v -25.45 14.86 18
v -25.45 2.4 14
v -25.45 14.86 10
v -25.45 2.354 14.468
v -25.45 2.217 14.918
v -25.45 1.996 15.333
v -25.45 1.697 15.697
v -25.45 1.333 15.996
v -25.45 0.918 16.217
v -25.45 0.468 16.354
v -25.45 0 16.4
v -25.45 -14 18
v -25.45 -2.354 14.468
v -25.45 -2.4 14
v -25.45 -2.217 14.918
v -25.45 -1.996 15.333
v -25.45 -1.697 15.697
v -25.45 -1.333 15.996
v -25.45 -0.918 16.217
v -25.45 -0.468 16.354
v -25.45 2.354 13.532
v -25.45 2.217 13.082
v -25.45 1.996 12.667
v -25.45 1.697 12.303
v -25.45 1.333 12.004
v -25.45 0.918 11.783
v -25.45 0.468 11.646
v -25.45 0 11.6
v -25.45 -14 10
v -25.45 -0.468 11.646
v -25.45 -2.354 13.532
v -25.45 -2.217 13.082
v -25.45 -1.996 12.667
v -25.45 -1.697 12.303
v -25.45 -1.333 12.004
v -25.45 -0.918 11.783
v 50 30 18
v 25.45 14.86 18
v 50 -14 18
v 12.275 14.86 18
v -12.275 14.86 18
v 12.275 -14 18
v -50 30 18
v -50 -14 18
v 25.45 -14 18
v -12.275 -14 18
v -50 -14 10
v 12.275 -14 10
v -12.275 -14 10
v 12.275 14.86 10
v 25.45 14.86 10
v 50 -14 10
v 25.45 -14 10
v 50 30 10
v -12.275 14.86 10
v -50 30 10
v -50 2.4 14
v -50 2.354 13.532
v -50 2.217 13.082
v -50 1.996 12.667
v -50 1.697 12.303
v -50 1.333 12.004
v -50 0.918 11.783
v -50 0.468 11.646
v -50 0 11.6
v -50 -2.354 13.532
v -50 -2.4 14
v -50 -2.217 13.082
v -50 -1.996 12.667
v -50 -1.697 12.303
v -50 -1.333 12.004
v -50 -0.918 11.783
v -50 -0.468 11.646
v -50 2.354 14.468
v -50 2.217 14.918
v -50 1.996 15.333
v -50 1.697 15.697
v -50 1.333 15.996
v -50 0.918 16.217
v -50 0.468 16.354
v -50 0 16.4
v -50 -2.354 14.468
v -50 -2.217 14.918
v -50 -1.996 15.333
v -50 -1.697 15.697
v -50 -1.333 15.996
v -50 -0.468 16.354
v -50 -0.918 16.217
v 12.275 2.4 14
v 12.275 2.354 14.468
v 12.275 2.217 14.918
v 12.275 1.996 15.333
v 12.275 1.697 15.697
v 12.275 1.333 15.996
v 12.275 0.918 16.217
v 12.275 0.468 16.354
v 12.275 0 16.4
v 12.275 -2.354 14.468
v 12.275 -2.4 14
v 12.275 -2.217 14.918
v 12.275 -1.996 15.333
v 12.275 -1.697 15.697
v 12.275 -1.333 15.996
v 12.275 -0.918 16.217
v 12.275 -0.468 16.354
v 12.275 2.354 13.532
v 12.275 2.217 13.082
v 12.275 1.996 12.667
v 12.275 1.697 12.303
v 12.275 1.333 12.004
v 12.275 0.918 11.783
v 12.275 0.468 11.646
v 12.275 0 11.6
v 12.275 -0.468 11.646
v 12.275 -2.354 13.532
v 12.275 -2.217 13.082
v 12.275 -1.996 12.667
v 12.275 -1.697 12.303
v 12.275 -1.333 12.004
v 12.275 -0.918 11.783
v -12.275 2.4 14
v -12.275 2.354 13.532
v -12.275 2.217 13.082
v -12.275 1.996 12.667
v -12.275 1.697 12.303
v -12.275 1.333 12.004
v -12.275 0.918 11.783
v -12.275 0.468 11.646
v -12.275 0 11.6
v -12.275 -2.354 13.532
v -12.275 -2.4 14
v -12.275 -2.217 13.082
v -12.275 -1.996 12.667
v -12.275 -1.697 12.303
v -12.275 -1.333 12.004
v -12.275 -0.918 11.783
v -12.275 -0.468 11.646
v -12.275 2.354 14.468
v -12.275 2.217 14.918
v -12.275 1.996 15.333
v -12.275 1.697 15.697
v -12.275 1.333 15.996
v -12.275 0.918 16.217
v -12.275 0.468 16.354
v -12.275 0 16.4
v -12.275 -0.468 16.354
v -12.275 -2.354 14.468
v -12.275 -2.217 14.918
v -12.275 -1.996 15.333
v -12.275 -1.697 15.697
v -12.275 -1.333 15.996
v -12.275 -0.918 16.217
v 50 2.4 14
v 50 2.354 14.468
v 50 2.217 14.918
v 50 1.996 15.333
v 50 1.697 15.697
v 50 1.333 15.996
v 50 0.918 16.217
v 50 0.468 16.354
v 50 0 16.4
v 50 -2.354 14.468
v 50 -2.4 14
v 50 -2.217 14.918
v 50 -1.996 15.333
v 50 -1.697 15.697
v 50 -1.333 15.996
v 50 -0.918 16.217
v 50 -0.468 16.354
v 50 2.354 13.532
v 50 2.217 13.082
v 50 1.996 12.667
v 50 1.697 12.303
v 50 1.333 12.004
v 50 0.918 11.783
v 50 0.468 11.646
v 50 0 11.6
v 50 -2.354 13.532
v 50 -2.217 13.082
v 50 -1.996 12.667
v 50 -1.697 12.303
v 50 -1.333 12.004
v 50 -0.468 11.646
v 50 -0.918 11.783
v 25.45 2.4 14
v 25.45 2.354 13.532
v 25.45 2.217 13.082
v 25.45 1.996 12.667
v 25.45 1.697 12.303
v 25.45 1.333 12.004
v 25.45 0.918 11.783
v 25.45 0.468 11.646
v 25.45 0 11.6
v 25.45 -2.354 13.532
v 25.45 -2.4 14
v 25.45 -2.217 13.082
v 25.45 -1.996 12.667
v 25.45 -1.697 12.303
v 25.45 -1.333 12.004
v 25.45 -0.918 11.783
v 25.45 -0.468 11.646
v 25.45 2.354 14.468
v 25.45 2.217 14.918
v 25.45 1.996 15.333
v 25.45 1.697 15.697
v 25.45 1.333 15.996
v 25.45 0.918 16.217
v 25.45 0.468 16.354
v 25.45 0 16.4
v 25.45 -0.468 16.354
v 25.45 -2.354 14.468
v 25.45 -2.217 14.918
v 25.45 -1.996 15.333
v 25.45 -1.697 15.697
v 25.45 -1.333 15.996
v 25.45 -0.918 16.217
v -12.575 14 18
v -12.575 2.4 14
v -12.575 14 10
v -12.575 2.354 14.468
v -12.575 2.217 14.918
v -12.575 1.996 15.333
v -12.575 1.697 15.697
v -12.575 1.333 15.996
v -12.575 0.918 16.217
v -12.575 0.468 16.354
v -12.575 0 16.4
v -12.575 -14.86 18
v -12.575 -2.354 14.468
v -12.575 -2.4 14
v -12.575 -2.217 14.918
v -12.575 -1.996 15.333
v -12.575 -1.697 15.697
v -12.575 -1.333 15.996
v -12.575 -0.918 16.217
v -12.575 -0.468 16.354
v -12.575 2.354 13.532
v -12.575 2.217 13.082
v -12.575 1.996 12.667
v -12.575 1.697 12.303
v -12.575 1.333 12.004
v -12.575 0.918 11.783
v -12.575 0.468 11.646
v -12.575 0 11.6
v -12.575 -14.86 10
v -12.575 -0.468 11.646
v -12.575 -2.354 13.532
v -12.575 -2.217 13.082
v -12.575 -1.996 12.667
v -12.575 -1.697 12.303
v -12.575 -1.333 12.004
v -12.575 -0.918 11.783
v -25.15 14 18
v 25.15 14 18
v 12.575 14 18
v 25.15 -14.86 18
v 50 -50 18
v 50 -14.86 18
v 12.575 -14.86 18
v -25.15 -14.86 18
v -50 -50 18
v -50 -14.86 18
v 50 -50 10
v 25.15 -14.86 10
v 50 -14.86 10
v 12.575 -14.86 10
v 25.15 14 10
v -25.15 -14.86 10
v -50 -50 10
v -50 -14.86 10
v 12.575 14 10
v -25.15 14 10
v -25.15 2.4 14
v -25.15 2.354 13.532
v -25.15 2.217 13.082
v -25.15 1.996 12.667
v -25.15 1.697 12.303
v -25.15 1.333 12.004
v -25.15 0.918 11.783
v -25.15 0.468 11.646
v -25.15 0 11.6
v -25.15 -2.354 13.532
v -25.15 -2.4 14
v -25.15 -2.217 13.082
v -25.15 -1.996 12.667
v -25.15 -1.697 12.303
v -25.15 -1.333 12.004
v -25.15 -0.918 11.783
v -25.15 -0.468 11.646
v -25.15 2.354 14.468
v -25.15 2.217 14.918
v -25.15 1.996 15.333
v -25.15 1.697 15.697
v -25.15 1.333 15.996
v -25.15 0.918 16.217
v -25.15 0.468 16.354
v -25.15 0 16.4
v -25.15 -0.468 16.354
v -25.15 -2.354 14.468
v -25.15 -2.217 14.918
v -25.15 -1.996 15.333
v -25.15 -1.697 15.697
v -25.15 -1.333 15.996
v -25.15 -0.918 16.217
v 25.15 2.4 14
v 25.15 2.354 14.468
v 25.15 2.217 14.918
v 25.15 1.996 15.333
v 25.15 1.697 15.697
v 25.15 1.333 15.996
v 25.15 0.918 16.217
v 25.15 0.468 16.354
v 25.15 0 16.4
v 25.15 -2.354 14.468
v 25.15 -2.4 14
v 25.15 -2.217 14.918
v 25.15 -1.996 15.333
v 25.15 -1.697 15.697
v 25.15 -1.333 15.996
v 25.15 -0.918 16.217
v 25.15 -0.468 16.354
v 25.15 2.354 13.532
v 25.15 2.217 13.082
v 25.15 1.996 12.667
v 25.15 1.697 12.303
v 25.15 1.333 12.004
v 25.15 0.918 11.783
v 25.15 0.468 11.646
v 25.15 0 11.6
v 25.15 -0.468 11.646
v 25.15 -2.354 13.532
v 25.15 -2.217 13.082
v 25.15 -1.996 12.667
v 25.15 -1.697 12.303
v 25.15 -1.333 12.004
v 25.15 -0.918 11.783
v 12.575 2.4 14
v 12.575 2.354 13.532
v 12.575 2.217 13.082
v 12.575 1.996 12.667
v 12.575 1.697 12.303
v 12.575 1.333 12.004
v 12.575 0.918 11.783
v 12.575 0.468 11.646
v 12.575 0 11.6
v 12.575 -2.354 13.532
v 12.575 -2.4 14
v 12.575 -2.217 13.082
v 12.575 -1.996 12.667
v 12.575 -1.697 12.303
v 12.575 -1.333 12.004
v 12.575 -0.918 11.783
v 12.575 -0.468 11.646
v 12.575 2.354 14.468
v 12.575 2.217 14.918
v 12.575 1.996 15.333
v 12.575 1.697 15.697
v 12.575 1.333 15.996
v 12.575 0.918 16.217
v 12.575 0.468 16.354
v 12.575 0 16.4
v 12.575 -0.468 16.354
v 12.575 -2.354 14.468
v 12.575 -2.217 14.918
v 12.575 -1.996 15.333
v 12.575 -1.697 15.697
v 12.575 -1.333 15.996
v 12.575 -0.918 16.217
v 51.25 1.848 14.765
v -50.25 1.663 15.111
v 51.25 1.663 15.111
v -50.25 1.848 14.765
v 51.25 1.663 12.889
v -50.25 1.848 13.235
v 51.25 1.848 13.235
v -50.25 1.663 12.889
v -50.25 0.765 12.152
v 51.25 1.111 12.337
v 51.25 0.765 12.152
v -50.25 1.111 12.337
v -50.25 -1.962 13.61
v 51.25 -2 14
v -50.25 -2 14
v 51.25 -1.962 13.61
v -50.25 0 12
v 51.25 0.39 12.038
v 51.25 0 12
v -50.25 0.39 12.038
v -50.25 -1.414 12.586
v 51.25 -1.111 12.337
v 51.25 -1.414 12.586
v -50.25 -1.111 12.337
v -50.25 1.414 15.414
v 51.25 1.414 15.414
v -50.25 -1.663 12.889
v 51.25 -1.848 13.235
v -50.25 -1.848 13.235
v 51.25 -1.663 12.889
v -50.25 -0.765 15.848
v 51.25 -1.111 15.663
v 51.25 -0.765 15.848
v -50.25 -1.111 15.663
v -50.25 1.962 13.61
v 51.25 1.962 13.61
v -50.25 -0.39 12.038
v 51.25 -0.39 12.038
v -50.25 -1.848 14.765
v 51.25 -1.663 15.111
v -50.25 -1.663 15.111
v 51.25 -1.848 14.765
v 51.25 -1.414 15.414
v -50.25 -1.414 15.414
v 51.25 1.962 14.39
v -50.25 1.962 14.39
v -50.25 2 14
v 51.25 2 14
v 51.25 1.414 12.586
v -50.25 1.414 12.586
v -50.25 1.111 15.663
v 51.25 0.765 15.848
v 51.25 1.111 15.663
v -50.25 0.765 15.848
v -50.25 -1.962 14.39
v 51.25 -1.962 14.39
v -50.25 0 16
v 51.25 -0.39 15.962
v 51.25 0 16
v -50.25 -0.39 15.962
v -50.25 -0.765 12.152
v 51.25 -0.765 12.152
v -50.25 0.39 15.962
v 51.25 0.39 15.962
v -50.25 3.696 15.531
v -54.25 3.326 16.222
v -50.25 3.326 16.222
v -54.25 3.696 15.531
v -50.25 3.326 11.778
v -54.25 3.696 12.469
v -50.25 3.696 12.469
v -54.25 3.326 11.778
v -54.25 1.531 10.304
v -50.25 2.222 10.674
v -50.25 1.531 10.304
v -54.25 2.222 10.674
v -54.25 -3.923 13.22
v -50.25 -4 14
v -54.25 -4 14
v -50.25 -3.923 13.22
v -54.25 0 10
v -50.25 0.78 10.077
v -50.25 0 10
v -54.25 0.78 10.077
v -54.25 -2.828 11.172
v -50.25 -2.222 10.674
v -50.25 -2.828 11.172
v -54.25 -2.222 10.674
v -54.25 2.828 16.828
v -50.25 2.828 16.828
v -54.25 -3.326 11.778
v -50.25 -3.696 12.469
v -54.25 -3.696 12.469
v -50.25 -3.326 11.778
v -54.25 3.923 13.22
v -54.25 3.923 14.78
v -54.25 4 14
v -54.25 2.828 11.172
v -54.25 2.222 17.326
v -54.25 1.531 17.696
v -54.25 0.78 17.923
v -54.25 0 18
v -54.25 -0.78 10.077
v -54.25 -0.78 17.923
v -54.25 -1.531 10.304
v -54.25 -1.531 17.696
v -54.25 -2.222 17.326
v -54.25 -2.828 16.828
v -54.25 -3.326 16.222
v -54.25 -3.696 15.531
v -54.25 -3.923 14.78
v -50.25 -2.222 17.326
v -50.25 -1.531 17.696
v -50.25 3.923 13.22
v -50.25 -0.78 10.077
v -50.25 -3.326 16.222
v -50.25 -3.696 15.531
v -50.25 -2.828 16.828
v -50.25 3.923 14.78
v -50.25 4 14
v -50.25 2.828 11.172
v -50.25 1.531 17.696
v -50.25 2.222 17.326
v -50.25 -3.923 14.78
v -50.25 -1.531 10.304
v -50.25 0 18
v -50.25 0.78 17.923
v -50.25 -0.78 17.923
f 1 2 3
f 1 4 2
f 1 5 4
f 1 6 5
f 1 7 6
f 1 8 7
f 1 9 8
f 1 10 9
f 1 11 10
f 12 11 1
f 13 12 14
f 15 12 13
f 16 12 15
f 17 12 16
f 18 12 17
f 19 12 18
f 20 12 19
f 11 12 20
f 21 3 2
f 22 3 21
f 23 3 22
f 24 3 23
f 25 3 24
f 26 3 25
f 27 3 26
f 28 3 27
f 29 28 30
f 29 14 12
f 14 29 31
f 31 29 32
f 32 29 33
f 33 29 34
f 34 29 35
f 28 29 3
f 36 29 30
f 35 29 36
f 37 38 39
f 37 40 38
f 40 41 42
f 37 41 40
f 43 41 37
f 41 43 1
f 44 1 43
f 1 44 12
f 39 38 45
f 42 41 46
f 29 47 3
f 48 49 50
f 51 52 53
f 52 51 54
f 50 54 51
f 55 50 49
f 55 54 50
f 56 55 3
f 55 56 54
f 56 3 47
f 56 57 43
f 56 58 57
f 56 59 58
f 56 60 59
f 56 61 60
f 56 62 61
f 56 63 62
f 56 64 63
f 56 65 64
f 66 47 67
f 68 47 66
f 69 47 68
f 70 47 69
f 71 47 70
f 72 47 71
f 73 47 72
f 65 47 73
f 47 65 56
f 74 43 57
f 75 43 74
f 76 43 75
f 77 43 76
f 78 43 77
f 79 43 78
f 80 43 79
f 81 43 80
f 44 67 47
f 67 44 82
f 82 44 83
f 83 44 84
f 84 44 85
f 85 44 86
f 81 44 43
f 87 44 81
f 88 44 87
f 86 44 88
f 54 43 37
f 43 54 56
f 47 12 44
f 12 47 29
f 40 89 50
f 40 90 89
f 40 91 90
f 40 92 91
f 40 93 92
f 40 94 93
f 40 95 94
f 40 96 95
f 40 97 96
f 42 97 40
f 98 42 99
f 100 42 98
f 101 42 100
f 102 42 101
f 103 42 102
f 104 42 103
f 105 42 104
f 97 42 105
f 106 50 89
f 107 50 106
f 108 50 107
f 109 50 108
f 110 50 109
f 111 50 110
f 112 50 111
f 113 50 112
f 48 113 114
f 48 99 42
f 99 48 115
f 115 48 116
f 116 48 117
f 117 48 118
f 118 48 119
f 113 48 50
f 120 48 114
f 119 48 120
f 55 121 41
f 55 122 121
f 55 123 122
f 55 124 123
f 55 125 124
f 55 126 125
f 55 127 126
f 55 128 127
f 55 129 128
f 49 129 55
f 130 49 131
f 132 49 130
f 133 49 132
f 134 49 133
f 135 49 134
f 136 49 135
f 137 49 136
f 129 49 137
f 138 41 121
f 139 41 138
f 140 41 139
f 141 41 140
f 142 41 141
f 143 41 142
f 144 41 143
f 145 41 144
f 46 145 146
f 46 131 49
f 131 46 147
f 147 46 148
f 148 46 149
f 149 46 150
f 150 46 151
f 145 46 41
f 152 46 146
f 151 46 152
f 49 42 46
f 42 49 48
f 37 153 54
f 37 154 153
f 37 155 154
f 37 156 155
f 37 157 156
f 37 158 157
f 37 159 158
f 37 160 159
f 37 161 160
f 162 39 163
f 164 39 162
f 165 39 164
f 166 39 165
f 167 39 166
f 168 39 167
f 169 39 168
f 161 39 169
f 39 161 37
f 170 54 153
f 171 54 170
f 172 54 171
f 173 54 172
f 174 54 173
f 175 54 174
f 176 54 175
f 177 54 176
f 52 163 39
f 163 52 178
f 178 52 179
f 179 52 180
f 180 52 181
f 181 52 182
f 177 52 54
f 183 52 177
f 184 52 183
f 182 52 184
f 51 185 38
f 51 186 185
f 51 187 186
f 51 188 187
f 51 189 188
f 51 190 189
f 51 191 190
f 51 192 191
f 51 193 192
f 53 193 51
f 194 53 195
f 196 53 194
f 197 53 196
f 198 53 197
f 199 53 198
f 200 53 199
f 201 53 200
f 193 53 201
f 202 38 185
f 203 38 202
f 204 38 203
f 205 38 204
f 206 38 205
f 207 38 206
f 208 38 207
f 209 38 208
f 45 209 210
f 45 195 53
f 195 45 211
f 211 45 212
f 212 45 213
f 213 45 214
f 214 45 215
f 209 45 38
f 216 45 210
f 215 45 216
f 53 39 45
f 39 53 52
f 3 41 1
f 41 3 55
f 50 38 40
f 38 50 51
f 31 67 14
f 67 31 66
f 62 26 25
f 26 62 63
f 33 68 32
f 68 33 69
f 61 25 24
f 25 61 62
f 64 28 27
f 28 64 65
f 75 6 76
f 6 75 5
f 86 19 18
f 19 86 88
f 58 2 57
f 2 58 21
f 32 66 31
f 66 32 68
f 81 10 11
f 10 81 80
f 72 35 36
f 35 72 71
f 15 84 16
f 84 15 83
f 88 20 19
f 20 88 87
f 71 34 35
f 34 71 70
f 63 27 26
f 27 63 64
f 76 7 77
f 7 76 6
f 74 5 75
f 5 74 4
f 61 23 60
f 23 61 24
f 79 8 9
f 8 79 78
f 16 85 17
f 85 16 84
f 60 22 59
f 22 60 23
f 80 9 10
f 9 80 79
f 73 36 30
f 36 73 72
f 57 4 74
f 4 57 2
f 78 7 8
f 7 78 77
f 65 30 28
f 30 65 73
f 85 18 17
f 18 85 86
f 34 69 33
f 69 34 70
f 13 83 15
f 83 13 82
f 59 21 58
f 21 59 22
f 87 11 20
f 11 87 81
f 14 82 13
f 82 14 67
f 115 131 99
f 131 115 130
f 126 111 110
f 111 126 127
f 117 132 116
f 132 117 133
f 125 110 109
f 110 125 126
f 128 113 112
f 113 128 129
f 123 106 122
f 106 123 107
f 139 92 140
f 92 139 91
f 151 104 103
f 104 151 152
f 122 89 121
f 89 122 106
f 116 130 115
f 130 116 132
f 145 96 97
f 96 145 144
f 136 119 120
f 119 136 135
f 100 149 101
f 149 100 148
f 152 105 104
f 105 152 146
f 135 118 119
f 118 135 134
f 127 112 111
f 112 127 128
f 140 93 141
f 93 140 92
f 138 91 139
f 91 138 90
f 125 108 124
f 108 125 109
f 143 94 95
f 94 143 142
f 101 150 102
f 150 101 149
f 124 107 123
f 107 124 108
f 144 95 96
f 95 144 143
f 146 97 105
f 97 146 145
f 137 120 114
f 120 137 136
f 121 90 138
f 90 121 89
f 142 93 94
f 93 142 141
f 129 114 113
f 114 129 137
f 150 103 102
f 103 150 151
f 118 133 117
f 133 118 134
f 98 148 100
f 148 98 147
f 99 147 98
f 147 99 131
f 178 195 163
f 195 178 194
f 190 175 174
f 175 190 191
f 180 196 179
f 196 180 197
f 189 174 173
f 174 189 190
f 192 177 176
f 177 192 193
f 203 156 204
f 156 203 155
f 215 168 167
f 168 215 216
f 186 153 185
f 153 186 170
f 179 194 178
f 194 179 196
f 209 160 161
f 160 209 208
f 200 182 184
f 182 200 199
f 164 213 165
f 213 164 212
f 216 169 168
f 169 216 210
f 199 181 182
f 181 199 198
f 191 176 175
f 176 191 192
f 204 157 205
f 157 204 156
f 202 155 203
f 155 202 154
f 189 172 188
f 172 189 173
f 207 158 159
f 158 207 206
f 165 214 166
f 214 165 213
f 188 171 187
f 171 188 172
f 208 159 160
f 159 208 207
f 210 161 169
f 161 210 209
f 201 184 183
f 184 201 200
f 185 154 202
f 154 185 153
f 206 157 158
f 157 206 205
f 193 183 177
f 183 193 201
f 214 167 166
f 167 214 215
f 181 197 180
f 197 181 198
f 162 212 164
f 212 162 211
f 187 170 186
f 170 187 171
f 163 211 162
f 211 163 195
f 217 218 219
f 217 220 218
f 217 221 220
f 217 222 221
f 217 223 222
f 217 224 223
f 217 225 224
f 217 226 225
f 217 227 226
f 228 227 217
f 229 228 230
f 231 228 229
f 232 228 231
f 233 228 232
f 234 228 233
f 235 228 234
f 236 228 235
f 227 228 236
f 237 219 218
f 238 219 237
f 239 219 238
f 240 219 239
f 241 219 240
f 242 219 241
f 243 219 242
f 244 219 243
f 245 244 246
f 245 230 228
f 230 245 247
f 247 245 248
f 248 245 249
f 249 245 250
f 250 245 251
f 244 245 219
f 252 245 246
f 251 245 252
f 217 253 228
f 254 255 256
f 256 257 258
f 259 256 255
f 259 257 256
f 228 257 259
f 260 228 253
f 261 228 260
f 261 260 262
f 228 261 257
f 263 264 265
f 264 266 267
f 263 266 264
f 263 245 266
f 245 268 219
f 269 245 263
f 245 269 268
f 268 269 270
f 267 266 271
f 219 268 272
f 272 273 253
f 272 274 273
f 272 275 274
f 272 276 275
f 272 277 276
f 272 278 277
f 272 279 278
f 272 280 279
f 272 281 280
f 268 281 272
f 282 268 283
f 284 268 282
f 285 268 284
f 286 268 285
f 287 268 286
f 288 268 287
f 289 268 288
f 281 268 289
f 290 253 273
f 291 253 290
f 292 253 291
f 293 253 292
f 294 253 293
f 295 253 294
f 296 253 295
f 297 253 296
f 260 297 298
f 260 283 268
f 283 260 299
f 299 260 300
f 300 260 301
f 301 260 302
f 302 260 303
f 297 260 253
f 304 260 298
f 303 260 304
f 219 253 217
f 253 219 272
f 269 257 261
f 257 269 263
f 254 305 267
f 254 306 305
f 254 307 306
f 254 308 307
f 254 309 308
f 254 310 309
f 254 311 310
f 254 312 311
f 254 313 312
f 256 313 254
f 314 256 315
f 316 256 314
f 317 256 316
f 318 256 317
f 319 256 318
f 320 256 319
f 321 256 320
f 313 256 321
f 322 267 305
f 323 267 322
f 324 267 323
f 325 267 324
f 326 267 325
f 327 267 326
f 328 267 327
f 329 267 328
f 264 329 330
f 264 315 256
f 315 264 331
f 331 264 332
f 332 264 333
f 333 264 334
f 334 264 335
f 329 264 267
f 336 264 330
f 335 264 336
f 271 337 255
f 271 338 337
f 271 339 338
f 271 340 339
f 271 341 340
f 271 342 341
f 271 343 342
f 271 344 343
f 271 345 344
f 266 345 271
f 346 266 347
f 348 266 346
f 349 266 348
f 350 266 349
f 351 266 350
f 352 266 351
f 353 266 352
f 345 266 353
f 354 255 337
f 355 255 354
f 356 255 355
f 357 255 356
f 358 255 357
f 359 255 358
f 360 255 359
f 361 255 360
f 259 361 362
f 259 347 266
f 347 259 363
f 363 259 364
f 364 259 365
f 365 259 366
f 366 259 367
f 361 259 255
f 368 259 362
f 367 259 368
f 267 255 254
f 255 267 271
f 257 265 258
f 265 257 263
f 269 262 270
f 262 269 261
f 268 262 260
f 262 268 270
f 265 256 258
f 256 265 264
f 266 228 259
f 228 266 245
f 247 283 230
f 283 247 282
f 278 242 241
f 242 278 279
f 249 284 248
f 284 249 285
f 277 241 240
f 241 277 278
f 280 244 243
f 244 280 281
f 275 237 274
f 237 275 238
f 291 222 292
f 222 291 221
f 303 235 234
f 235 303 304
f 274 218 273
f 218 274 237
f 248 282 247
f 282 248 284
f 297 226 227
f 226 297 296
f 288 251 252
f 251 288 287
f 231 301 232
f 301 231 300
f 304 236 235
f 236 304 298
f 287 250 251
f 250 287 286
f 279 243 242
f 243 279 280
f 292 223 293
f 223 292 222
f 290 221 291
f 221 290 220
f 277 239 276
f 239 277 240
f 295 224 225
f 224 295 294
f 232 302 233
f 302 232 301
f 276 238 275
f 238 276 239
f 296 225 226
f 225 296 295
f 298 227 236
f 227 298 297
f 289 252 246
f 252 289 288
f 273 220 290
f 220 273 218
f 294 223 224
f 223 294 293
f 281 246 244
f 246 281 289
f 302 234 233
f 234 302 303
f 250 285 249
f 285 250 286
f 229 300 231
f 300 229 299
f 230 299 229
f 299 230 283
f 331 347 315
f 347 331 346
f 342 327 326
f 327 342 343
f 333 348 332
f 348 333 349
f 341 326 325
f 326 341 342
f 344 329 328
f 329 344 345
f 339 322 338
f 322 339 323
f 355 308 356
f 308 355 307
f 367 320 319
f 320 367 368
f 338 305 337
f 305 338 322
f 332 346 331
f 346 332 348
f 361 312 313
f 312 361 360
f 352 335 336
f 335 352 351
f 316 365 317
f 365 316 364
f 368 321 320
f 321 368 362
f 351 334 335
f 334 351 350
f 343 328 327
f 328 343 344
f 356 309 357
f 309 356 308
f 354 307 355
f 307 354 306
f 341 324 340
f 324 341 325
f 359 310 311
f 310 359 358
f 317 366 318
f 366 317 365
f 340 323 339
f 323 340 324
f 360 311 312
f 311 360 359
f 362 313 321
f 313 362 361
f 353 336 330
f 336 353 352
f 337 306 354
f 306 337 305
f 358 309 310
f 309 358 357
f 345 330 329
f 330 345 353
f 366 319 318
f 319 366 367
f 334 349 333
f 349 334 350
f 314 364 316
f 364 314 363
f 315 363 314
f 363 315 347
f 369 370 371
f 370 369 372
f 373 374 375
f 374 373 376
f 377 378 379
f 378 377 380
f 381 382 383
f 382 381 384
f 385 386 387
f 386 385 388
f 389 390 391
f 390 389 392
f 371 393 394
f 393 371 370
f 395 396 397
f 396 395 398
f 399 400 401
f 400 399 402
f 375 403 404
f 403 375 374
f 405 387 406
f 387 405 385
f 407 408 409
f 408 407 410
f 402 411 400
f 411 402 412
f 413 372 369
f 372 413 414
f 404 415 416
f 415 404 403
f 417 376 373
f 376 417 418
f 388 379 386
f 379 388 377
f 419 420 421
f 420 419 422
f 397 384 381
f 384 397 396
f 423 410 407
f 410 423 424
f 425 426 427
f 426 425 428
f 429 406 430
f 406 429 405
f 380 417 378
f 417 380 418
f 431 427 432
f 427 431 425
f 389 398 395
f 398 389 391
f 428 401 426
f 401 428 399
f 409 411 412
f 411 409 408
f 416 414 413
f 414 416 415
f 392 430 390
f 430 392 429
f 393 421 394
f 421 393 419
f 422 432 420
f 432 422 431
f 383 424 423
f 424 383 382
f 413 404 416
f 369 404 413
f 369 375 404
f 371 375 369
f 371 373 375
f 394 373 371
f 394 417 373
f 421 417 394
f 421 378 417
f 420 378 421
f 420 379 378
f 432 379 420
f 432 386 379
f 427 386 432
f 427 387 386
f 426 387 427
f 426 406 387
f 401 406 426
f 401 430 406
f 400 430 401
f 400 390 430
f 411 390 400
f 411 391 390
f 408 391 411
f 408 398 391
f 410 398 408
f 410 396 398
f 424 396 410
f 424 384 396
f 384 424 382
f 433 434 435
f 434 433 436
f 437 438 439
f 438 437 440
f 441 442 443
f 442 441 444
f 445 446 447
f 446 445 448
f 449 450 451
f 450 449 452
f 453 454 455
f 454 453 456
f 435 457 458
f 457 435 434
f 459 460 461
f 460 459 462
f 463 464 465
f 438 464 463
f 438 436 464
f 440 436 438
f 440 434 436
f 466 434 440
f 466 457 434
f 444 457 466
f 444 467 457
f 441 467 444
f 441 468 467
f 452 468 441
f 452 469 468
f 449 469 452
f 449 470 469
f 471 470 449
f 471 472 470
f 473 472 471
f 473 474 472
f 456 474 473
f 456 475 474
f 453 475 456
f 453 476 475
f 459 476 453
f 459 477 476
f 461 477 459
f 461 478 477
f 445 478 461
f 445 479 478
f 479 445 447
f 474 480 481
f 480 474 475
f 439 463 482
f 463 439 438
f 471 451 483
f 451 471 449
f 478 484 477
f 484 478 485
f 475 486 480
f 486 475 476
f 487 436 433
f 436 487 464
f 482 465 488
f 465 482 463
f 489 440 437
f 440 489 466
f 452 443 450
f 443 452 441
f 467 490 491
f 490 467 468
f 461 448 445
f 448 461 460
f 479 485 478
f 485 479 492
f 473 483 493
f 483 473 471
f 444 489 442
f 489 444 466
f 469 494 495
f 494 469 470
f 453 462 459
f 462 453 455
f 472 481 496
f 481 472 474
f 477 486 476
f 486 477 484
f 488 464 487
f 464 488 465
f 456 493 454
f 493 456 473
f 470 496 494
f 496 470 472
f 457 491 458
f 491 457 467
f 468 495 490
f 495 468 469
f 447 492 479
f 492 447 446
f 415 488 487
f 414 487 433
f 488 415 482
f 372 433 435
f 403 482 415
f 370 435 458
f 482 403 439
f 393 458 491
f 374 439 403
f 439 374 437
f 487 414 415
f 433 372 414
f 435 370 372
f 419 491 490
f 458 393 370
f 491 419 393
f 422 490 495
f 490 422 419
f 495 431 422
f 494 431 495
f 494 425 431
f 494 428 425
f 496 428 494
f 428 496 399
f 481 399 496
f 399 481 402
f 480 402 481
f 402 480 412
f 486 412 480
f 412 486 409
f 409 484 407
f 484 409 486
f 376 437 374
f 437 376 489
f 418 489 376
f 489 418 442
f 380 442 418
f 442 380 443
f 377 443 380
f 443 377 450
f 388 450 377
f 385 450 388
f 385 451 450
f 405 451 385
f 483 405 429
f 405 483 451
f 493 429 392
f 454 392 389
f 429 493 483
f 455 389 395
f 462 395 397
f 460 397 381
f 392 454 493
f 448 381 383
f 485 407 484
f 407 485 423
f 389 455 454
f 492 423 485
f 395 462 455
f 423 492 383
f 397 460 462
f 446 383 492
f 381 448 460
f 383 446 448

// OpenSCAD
$fn = 32;

// ------------------------------------------------------------------------
// Butt hinge: hinge 100 mm, leaf swung 0 deg
// Every part is its own module, assembly() places every instance.
// ------------------------------------------------------------------------

// --- part 1 ---
module hinge_base() {
  difference() {
    union() {
      translate([-50, -14, -4]) cube([24.55, 44, 8]);
      translate([-12.275, -14, -4]) cube([24.55, 44, 8]);
      translate([25.45, -14, -4]) cube([24.55, 44, 8]);
      translate([-50, 14.86, -4]) cube([100, 15.14, 8]);
    }
    translate([-37.725, 0, 0]) rotate([0, 90, 0]) cylinder(h = 26.55, d = 4.8, center = true);
    translate([0, 0, 0]) rotate([0, 90, 0]) cylinder(h = 26.55, d = 4.8, center = true);
    translate([37.725, 0, 0]) rotate([0, 90, 0]) cylinder(h = 26.55, d = 4.8, center = true);
  }
}

// --- part 2 ---
module hinge_mover() {
  difference() {
    union() {
      translate([-25.15, -50, -4]) cube([12.575, 64, 8]);
      translate([12.575, -50, -4]) cube([12.575, 64, 8]);
      translate([-50, -50, -4]) cube([100, 35.14, 8]);
    }
    translate([-18.863, 0, 0]) rotate([0, 90, 0]) cylinder(h = 14.575, d = 4.8, center = true);
    translate([18.863, 0, 0]) rotate([0, 90, 0]) cylinder(h = 14.575, d = 4.8, center = true);
  }
}

// --- part 3 ---
module hinge_pin() {
  rotate([0, 90, 0]) cylinder(h = 102.5, d = 4, center = true);
  translate([-54.25, 0, 0]) rotate([0, 90, 0]) cylinder(h = 4, d = 8);
}

// --- assembly ---
module assembly() {
  color([0.80, 0.24, 0.20]) translate([0, 0, 14]) rotate([0, 0, 0]) hinge_base();
  color([0.20, 0.45, 0.75]) translate([0, 0, 14]) rotate([0, 0, 0]) hinge_mover();
  color([0.25, 0.62, 0.32]) translate([0, 0, 14]) rotate([0, 0, 0]) hinge_pin();
}

assembly();
